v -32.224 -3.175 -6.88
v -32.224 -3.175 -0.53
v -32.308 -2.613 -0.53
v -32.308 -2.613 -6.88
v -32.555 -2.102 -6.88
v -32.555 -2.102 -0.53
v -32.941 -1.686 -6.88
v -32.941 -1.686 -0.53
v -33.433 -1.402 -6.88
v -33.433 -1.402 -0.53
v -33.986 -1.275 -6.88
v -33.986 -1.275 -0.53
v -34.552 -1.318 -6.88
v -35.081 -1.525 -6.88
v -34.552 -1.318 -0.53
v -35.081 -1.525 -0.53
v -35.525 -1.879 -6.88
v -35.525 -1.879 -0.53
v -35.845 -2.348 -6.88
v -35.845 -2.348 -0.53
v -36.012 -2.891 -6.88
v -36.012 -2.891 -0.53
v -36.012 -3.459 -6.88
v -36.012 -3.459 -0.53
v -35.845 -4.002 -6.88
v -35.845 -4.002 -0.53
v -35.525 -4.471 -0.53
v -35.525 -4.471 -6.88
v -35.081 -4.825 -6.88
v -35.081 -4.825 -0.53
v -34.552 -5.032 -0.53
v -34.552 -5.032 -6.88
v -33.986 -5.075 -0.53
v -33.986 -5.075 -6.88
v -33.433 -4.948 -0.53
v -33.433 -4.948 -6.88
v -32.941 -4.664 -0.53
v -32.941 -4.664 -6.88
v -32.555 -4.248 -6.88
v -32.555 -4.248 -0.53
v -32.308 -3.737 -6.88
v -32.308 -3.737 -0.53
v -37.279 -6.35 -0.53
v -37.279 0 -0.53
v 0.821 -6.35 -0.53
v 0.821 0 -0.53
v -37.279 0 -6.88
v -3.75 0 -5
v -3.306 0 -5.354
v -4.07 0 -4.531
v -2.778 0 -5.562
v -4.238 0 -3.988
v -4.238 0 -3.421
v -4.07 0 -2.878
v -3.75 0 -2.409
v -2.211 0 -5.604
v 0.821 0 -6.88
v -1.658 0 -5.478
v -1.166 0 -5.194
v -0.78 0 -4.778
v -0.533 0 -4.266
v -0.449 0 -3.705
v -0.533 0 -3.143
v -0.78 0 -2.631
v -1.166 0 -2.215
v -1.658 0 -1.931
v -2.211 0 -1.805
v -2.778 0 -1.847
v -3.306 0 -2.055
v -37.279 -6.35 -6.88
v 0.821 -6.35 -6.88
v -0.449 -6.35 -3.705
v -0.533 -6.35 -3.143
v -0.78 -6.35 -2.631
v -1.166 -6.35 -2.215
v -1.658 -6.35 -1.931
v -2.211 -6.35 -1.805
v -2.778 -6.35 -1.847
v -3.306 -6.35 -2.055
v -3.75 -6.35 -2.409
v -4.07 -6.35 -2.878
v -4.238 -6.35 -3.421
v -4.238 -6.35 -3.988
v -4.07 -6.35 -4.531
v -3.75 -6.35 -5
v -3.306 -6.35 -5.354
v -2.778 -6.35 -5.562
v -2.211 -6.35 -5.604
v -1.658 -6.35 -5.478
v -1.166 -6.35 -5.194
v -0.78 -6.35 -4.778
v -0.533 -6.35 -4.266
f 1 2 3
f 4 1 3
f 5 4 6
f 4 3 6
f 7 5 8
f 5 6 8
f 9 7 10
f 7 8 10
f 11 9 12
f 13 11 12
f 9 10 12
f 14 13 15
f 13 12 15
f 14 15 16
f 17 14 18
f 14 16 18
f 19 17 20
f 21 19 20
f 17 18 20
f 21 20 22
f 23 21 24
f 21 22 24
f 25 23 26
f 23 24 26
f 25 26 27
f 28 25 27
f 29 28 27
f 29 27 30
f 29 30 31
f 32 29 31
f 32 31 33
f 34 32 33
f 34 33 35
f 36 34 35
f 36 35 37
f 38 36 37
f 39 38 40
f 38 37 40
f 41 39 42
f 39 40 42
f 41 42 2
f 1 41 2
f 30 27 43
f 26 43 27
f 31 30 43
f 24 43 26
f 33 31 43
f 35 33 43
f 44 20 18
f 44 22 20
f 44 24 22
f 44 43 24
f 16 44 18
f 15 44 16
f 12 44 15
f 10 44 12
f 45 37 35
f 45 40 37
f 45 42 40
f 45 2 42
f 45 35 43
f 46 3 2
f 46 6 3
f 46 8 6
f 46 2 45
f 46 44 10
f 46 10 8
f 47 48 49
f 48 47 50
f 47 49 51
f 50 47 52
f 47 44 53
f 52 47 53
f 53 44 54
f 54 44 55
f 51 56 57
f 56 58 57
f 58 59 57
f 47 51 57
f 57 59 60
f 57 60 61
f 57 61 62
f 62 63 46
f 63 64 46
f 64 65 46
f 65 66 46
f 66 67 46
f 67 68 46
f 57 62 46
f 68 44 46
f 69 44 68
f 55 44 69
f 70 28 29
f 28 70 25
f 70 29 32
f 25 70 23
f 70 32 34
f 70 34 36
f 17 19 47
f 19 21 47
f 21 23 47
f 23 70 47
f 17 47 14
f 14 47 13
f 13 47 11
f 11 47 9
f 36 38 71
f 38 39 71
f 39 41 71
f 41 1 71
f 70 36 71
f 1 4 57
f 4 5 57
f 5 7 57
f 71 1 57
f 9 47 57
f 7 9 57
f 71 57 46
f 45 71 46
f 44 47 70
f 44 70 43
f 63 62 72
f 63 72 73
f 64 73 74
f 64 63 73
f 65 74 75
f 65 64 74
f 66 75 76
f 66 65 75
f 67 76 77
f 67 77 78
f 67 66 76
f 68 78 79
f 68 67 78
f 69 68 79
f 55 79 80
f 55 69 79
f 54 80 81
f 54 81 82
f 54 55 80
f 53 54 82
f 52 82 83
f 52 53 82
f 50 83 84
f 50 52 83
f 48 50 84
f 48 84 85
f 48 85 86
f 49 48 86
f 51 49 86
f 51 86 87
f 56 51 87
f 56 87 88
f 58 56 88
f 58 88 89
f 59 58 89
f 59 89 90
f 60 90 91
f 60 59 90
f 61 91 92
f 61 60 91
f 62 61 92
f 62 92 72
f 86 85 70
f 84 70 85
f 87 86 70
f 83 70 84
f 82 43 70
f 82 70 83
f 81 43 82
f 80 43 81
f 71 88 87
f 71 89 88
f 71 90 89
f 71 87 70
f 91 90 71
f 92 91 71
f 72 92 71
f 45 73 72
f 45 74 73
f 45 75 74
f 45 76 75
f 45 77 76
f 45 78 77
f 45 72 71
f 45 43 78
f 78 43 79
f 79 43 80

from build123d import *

# Parameters (mm, degrees)
F0_W     = 38.1
F0_H     = 6.35
F0_R     = 1.905
F1_DEPTH = 6.35
F2_R     = 1.905
F3_DEPTH = 6.35


# Not quite as in the source:
# - a feature names something its author has since deleted; it is built from what else it names


with BuildPart() as f1:
    # F0 (on Front) → F1 (new body)
    with BuildSketch(Plane.XZ):
        with Locations((-18.2288356441, -3.7045082716)):
            Rectangle(F0_W, F0_H)
        with Locations((-2.3538356441, -3.7045082716)):
            Circle(F0_R, mode=Mode.SUBTRACT)
    extrude(amount=F1_DEPTH)

    # F2 (on face) → F3 (cut)
    with BuildSketch(Plane.XY.offset(-0.5295082716)):
        with Locations((-34.1285004571, -3.175)):
            Circle(F2_R)
    extrude(amount=-F3_DEPTH, mode=Mode.SUBTRACT)


solid = f1.part
